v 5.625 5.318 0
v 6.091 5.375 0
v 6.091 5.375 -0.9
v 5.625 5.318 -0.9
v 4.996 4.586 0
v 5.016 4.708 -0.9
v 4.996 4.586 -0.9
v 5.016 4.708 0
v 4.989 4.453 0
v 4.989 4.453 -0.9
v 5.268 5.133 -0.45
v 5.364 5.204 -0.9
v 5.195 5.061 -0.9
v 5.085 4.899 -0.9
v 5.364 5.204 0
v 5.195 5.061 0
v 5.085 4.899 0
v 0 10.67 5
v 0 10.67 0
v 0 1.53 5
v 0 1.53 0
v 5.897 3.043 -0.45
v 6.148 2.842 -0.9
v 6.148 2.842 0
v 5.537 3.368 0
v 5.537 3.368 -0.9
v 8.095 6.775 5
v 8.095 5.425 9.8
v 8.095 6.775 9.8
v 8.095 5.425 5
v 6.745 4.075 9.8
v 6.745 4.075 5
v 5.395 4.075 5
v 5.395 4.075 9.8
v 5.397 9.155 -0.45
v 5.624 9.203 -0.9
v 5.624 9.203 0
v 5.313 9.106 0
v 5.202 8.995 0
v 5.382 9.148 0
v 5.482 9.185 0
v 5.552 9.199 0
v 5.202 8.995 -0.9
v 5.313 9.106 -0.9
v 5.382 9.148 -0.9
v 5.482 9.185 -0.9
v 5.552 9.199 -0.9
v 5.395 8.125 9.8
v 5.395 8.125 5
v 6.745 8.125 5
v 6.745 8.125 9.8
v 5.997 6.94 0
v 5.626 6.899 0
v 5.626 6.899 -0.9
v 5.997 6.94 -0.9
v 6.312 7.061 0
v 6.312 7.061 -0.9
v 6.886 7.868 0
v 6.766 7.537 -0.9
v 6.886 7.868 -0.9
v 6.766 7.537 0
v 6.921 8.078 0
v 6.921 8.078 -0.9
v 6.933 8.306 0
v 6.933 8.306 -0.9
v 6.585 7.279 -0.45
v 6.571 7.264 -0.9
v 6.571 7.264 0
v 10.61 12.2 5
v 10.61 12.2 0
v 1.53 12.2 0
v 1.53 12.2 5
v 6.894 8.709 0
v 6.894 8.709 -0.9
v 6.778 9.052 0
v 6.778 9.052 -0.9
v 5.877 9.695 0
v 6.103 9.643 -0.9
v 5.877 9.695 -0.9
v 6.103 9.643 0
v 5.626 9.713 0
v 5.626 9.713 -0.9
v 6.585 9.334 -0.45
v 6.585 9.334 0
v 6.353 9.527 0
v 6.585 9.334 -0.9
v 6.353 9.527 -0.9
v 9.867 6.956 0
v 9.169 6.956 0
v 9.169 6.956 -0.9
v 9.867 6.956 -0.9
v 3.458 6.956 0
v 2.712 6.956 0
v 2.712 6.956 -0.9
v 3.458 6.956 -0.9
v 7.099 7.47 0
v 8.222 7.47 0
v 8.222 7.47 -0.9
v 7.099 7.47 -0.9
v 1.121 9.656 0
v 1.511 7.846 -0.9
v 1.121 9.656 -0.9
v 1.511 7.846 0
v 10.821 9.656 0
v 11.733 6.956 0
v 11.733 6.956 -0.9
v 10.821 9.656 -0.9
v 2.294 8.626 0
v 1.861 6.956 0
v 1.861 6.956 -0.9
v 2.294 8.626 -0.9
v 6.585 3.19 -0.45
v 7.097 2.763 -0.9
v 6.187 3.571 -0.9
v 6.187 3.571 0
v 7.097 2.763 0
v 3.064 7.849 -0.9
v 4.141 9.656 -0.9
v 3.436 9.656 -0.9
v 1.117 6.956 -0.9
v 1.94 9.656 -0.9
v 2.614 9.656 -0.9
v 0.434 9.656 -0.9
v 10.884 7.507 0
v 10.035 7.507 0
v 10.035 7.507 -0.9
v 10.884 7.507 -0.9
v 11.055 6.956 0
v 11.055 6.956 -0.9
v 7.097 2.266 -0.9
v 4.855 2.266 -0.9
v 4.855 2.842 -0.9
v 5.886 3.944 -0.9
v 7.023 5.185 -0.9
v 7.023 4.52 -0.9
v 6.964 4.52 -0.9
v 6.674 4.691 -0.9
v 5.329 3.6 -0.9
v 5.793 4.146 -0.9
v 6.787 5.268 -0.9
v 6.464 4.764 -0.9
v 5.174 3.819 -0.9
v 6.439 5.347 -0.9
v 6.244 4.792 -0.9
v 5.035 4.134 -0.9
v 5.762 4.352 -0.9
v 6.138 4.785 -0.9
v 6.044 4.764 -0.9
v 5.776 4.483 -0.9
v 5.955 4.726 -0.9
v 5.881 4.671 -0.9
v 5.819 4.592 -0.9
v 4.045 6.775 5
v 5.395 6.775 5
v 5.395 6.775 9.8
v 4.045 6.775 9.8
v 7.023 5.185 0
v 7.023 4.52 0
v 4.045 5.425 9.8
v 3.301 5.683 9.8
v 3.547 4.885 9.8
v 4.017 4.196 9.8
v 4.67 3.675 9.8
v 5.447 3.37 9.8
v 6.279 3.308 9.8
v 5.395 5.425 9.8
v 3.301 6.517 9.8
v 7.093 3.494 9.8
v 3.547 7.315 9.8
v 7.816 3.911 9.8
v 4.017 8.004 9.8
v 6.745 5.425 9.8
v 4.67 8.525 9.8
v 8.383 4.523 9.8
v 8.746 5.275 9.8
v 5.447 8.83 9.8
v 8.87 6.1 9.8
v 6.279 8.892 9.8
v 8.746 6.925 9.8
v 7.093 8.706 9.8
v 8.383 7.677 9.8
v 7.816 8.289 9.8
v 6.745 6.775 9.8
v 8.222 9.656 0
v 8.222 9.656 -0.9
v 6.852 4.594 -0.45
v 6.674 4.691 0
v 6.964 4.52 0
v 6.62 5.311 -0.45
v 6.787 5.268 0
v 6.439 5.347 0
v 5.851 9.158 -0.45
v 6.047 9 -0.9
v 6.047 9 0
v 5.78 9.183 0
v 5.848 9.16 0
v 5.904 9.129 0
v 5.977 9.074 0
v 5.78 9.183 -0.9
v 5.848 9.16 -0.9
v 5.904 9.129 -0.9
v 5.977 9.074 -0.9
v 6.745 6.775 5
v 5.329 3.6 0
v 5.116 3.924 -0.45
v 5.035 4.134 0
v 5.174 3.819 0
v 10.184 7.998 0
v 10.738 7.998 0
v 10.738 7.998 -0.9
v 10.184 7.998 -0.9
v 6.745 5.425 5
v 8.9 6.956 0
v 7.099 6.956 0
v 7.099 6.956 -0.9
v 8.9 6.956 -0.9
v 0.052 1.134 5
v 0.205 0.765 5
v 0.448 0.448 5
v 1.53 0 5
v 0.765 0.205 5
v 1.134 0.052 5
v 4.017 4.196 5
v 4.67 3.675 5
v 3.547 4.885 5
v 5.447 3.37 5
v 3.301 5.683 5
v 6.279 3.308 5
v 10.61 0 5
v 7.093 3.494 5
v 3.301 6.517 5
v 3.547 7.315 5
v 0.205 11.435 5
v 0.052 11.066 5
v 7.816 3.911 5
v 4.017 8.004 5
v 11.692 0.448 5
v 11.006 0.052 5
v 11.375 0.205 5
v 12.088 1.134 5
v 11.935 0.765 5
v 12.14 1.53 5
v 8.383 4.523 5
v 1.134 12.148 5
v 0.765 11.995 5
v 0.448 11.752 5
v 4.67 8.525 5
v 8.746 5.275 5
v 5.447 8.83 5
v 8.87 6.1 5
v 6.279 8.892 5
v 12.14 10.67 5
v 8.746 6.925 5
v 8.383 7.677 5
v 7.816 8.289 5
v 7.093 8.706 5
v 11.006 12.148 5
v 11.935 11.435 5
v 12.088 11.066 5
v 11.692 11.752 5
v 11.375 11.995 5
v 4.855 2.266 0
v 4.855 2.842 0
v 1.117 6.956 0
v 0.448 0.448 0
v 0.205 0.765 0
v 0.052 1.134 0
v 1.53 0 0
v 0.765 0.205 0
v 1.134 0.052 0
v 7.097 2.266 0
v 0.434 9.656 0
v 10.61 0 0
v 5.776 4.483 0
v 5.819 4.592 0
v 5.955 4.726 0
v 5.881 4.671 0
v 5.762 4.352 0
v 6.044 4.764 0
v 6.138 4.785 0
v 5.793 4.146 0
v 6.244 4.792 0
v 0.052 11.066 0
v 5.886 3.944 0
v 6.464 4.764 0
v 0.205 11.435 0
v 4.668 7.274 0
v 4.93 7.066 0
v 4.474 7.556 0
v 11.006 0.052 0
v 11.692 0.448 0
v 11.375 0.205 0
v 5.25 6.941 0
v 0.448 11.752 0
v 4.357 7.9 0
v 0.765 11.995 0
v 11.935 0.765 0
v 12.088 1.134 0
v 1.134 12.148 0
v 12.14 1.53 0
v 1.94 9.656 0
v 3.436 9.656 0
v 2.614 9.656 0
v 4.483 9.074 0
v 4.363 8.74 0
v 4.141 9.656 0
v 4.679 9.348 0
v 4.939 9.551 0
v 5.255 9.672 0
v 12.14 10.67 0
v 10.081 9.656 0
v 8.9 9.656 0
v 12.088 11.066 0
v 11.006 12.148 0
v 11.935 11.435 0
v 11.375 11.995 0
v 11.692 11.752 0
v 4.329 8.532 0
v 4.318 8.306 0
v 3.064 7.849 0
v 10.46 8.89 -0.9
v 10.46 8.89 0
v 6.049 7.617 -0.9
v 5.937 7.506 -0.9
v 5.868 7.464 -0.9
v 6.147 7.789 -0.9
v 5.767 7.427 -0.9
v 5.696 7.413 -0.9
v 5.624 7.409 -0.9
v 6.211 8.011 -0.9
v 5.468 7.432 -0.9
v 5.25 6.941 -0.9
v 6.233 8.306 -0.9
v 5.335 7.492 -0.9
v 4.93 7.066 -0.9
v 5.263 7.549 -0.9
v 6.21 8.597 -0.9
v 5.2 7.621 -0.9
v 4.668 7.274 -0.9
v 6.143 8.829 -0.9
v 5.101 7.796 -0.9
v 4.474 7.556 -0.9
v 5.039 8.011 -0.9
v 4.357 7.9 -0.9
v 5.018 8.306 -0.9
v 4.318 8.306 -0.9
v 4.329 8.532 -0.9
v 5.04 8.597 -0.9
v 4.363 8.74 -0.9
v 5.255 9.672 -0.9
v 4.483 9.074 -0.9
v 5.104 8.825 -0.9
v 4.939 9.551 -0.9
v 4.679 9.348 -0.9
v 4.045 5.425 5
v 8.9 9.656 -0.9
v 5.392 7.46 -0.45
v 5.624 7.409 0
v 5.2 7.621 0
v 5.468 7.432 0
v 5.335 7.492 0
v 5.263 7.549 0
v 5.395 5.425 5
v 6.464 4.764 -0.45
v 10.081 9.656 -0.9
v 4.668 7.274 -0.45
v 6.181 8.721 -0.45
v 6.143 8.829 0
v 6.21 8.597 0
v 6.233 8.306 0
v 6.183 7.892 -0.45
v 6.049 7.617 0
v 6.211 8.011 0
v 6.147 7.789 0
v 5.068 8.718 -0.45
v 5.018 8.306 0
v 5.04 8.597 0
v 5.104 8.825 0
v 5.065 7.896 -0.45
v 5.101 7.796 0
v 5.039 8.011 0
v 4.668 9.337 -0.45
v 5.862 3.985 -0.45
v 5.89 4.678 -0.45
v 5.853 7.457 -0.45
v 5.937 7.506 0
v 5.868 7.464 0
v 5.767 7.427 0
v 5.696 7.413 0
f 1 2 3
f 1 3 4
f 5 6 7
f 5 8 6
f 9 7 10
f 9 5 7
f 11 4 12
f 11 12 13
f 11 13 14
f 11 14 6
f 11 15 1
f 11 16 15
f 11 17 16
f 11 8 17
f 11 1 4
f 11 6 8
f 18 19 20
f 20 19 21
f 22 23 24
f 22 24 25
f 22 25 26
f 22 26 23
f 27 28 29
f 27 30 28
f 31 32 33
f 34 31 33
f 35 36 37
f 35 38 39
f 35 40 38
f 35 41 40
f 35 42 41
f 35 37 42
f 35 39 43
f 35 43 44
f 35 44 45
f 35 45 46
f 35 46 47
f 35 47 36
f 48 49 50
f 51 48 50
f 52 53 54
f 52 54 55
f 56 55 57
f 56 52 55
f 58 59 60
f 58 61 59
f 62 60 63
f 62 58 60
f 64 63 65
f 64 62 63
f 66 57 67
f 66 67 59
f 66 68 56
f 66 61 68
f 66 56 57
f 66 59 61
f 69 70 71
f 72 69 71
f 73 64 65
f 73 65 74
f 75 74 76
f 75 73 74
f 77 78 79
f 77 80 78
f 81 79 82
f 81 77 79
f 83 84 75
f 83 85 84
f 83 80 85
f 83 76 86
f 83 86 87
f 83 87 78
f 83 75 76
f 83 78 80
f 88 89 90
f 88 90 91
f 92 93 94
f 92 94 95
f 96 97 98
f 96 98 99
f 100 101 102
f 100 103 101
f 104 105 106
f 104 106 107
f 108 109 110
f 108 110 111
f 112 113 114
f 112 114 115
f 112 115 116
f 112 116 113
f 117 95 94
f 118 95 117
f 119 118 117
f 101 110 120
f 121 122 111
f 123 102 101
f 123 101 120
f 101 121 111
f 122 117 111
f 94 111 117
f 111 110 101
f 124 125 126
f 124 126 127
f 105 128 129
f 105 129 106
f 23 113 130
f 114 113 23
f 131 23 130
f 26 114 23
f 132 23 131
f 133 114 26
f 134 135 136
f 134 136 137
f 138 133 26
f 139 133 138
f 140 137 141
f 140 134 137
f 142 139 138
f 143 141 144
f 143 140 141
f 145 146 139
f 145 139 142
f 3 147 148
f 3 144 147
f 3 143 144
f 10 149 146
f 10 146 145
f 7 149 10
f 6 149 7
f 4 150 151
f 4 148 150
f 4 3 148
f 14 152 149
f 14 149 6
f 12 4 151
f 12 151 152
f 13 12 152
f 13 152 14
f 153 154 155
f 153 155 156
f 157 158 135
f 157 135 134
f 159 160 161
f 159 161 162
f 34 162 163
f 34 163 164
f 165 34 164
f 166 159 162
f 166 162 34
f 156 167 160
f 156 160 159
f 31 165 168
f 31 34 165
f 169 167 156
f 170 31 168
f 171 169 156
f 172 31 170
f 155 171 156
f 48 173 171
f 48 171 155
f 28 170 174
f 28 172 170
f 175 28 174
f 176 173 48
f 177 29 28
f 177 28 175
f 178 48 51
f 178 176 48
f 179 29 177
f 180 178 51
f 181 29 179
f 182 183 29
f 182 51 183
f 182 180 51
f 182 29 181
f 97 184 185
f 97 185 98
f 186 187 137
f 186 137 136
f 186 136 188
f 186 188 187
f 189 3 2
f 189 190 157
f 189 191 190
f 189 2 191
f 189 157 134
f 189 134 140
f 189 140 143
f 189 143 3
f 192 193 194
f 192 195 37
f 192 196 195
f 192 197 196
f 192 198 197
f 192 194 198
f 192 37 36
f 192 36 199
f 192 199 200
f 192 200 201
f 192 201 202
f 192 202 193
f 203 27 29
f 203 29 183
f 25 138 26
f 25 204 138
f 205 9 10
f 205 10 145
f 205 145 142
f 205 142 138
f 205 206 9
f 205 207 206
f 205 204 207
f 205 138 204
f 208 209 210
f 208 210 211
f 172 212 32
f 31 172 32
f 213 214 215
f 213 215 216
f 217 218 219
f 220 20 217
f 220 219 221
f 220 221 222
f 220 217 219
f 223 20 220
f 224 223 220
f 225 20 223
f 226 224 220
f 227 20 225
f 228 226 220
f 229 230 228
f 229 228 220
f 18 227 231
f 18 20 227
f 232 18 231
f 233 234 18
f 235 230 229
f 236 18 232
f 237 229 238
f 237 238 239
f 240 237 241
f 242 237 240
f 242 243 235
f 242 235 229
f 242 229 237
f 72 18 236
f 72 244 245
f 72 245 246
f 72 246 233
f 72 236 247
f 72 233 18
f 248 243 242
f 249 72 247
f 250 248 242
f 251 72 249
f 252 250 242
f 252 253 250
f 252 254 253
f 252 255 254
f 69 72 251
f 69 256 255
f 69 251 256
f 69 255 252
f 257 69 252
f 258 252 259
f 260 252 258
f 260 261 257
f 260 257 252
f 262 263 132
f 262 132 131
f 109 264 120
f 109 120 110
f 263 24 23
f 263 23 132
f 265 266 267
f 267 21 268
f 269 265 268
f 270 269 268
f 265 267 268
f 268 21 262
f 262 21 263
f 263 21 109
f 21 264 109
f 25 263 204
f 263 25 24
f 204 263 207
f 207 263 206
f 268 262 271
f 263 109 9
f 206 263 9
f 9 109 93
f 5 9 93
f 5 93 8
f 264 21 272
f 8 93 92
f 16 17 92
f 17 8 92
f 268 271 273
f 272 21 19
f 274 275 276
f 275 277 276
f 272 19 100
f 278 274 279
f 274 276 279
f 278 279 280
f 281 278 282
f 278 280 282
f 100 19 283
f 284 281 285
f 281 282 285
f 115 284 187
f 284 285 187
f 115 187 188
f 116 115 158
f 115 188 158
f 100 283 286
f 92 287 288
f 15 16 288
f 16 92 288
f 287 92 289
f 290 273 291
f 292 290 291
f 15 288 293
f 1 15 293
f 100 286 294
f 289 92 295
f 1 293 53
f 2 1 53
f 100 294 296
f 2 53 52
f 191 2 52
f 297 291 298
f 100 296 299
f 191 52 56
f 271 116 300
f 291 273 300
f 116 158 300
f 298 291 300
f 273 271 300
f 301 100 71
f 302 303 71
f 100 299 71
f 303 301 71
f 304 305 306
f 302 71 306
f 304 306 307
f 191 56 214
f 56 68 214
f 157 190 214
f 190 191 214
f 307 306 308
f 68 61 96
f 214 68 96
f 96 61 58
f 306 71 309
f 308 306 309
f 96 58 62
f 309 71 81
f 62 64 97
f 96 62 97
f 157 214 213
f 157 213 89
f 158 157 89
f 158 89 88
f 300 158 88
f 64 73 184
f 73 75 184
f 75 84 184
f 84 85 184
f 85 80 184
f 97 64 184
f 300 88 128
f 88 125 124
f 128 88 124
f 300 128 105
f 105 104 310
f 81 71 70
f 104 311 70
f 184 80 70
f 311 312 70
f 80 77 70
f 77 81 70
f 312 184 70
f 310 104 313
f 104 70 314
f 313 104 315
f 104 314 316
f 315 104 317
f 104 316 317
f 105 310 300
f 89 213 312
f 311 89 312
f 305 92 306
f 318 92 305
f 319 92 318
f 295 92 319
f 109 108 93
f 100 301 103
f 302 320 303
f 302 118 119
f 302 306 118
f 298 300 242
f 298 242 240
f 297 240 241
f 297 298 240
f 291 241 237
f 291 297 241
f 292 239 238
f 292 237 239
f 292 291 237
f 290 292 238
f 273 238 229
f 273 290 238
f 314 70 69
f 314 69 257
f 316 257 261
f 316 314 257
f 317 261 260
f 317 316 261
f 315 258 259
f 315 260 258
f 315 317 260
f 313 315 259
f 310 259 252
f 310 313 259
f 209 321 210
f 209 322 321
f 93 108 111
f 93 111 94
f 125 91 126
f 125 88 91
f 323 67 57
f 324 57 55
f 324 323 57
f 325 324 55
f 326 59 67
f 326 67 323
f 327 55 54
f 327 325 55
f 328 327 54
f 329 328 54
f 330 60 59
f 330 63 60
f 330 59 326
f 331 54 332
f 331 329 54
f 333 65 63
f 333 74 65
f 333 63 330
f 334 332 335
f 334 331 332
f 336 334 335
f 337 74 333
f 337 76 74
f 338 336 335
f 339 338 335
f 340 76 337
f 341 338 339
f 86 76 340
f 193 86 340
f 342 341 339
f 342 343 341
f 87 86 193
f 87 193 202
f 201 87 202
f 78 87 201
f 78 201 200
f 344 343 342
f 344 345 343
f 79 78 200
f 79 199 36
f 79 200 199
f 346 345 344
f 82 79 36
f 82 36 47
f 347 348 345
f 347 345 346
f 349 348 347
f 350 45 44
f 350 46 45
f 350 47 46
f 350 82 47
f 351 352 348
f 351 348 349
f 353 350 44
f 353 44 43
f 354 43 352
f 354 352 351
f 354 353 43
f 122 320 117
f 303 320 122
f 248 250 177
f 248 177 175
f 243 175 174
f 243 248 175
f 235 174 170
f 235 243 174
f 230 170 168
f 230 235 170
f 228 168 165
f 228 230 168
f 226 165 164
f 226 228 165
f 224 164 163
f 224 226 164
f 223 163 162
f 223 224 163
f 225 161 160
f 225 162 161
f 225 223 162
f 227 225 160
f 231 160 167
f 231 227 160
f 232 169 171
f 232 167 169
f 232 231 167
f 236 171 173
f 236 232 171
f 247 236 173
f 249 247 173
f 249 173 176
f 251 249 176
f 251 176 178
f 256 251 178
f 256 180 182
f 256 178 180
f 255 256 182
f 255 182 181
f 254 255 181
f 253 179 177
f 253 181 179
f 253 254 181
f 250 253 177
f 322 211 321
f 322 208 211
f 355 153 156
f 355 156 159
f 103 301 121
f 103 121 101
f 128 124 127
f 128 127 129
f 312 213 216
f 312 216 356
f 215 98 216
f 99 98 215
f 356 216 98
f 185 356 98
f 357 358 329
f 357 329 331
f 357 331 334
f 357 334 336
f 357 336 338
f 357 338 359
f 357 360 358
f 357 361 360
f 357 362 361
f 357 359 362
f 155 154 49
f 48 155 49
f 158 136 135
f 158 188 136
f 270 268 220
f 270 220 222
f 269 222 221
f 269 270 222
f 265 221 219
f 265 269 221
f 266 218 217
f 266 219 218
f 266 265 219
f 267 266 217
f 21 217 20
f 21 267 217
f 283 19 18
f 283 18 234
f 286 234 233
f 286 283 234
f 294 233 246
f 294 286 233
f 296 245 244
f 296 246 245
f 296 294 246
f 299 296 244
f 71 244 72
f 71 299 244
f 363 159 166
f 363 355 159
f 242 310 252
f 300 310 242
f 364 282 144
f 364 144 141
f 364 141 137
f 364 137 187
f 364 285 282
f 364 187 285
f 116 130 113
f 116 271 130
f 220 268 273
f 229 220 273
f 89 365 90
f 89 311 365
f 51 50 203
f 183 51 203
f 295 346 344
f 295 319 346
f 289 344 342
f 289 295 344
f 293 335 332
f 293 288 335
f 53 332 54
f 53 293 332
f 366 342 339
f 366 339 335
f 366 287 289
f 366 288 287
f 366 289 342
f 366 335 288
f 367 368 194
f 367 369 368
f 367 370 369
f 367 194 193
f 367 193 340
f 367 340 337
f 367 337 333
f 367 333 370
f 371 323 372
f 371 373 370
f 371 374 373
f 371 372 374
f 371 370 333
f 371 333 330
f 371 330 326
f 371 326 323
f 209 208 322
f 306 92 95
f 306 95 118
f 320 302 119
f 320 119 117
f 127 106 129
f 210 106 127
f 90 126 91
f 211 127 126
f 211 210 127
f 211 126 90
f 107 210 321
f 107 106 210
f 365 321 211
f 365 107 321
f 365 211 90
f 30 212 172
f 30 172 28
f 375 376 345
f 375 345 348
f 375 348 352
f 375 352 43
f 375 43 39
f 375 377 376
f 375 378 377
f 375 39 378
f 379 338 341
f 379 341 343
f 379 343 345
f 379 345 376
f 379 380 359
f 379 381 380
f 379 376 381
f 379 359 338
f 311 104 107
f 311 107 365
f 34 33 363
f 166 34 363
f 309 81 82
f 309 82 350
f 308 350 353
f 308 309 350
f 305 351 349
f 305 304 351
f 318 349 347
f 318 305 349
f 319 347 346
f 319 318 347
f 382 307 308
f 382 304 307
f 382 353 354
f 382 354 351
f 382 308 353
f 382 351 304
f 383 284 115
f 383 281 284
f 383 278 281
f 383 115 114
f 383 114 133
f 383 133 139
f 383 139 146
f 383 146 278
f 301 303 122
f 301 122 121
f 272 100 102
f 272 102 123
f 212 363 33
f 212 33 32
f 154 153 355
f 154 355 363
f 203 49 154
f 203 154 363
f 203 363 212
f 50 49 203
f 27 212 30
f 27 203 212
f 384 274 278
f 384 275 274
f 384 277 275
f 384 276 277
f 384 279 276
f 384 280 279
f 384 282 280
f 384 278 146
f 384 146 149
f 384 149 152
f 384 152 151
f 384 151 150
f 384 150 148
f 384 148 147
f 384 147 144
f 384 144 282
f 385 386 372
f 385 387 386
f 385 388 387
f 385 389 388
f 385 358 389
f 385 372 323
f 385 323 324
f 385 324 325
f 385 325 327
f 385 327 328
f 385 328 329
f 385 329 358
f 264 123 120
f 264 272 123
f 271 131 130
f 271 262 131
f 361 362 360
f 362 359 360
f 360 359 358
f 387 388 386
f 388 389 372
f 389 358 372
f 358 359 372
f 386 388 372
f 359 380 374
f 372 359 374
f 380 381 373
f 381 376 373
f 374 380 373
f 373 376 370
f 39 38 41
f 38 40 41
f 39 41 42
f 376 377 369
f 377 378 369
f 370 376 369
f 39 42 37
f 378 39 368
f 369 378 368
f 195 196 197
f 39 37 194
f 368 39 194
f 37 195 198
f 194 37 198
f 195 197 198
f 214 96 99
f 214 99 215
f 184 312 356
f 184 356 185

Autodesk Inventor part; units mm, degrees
ref_plane "YZ Plane" through (0, 0, 0) normal (1, 0, 0) x (0, 1, 0)
ref_plane "XZ Plane" through (0, 0, 0) normal (0, 1, 0) x (-1, 0, 0)
sketch "Sketch1" plane through (0, 0, 0) normal (0, 0, 1) x (1, 0, 0)
  line L0 (14.6962, 12.74) -> (14.6962, 0) construction
  line L1 (10.61, 12.2) -> (1.53, 12.2)
  arc A0 (1.53, 12.2) -> (0, 10.67) centre (1.53, 10.67) ccw
  line L2 (0, 10.67) -> (0, 1.53)
  arc A1 (0, 1.53) -> (1.53, 0) centre (1.53, 1.53) ccw
  line L3 (1.53, 0) -> (10.61, 0)
  arc A2 (10.61, 0) -> (12.14, 1.53) centre (10.61, 1.53) ccw
  arc A3 (12.14, 10.67) -> (10.61, 12.2) centre (10.61, 10.67) ccw
  line L4 (12.14, 10.67) -> (12.14, 1.53)
  point P0 (0, 0)
  point P1 (0, 0)
  dimension "d10" = 12.74
ref_plane "Work Plane1" through (0, 0, 5) normal (0, 0, 1) x (1, 0, 0)
sketch "Sketch2" plane through (0, 0, 5) normal (0, 0, 1) x (1, 0, 0)
  line L0 (10.88, 12.74) -> (1.8, 12.74) projected
  line L1 (10.88, 12.74) -> (1.8, 12.74) projected
  arc A0 (1.8, 12.74) -> (0, 10.94) centre (1.8, 10.94) ccw projected
  line L2 (0, 10.94) -> (0, 1.8) projected
  arc A1 (0, 1.8) -> (1.8, 0) centre (1.8, 1.8) ccw projected
  line L3 (1.8, 0) -> (10.88, 0) projected
  arc A2 (10.88, 0) -> (12.68, 1.8) centre (10.88, 1.8) ccw projected
  line L4 (12.68, 1.8) -> (12.68, 10.94) projected
  arc A3 (12.68, 10.94) -> (10.88, 12.74) centre (10.88, 10.94) ccw projected
  circle A4 centre (6.34, 6.37) radius 2.8
  line L5 (5.665, 8.395) -> (7.015, 8.395)
  line L6 (7.015, 4.345) -> (5.665, 4.345)
  line L7 (5.665, 4.345) -> (7.015, 8.395) construction
  line L8 (5.665, 8.395) -> (7.015, 4.345) construction
  line L9 (8.365, 5.695) -> (8.365, 7.045)
  line L10 (4.315, 7.045) -> (4.315, 5.695)
  line L11 (4.315, 5.695) -> (8.365, 7.045) construction
  line L12 (8.365, 5.695) -> (4.315, 7.045) construction
  line L13 (4.315, 5.695) -> (5.665, 5.695)
  line L14 (7.015, 5.695) -> (8.365, 5.695)
  line L15 (5.665, 4.345) -> (5.665, 5.695)
  line L16 (5.665, 7.045) -> (5.665, 8.395)
  line L17 (8.365, 7.045) -> (7.015, 7.045)
  line L18 (5.665, 7.045) -> (4.315, 7.045)
  line L19 (7.015, 8.395) -> (7.015, 7.045)
  line L20 (7.015, 5.695) -> (7.015, 4.345)
  point P0 (0, 0)
  dimension "d3" = 5.6
  dimension "d4" = 4.05
  dimension "d5" = 1.35
  dimension "d6" = 4.05
  dimension "d7" = 1.35
extrude "Extrusion3" add sketch "Sketch1" along normal blind 5
sketch "Sketch3" plane through (0, 0, 5) normal (0, 0, 1) x (1, 0, 0)
  line L0 (10.61, 12.47) -> (1.53, 12.47)
  line L1 (10.61, 12.47) -> (1.53, 12.47)
  arc A0 (1.53, 12.47) -> (-0.27, 10.67) centre (1.53, 10.67) ccw
  line L2 (-0.27, 10.67) -> (-0.27, 1.53)
  arc A1 (-0.27, 1.53) -> (1.53, -0.27) centre (1.53, 1.53) ccw
  line L3 (1.53, -0.27) -> (10.61, -0.27)
  arc A2 (10.61, -0.27) -> (12.41, 1.53) centre (10.61, 1.53) ccw
  line L4 (12.41, 1.53) -> (12.41, 10.67)
  arc A3 (12.41, 10.67) -> (10.61, 12.47) centre (10.61, 10.67) ccw
  circle A4 centre (6.07, 6.1) radius 2.8
  line L5 (5.395, 8.125) -> (6.745, 8.125)
  line L6 (6.745, 4.075) -> (5.395, 4.075)
  line L7 (5.395, 4.075) -> (6.745, 8.125) construction
  line L8 (5.395, 8.125) -> (6.745, 4.075) construction
  line L9 (8.095, 5.425) -> (8.095, 6.775)
  line L10 (4.045, 6.775) -> (4.045, 5.425)
  line L11 (4.045, 5.425) -> (8.095, 6.775) construction
  line L12 (8.095, 5.425) -> (4.045, 6.775) construction
  line L13 (4.045, 5.425) -> (5.395, 5.425)
  line L14 (6.745, 5.425) -> (8.095, 5.425)
  line L15 (5.395, 4.075) -> (5.395, 5.425)
  line L16 (5.395, 6.775) -> (5.395, 8.125)
  line L17 (8.095, 6.775) -> (6.745, 6.775)
  line L18 (5.395, 6.775) -> (4.045, 6.775)
  line L19 (6.745, 8.125) -> (6.745, 6.775)
  line L20 (6.745, 5.425) -> (6.745, 4.075)
  line L21 (10.61, 12.2) -> (1.53, 12.2) projected
  line L22 (0, 10.67) -> (0, 1.53) projected
  point P0 (0, 0)
  point P1 (-0.27, -0.27)
  point P2 (6.07, 12.2)
  point P3 (0, 6.1)
  point P4 (6.07, 6.1)
  dimension "d14" = 5.6
  dimension "d15" = 4.05
  dimension "d16" = 1.35
  dimension "d17" = 4.05
  dimension "d18" = 1.35
extrude "Extrusion4" add sketch "Sketch3" along normal blind 4.8 contours A4
sketch "Sketch4" plane through (0, 0, 0) normal (0, 0, -1) x (-1, 0, 0)
  line L0 (-1.53, 0) -> (-10.61, 0) projected
  line L1 (-11.7223, 9.7129) -> (-0.4177, 9.7129) construction
  line L2 (-0.4177, 9.7129) -> (-0.4177, 6.84) construction
  line L3 (-0.4177, 6.84) -> (-11.7223, 6.84) construction
  line L4 (-11.7223, 6.84) -> (-11.7223, 9.7129) construction
  line L5 (-7.4059, 5.3753) -> (-4.7341, 5.3753) construction
  line L6 (-4.7341, 5.3753) -> (-4.7341, 2.266) construction
  line L7 (-4.7341, 2.266) -> (-7.4059, 2.266) construction
  line L8 (-7.4059, 2.266) -> (-7.4059, 5.3753) construction
  line L9 (-11.7333, 6.956) -> (-10.8209, 9.656)
  line L10 (-10.8209, 9.656) -> (-10.0813, 9.656)
  line L11 (-10.0813, 9.656) -> (-9.1689, 6.956)
  line L12 (-9.1689, 6.956) -> (-9.8669, 6.956)
  line L13 (-9.8669, 6.956) -> (-10.0354, 7.5074)
  line L14 (-10.0354, 7.5074) -> (-10.8843, 7.5074)
  line L15 (-10.8843, 7.5074) -> (-11.055, 6.956)
  line L16 (-11.055, 6.956) -> (-11.7333, 6.956)
  line L17 (-10.1842, 7.9975) -> (-10.4598, 8.8902)
  line L18 (-10.4598, 8.8902) -> (-10.7377, 7.9975)
  line L19 (-10.7377, 7.9975) -> (-10.1842, 7.9975)
  line L20 (-7.0991, 6.956) -> (-8.8998, 6.956)
  line L21 (-8.8998, 6.956) -> (-8.8998, 9.656)
  line L22 (-8.8998, 9.656) -> (-8.2215, 9.656)
  line L23 (-8.2215, 9.656) -> (-8.2215, 7.4702)
  line L24 (-8.2215, 7.4702) -> (-7.0991, 7.4702)
  line L25 (-7.0991, 7.4702) -> (-7.0991, 6.956)
  spline S0 degree 2 poles (-4.3181, 8.306) (-4.3181, 7.6496) (-5.0183, 6.8991) (-5.6265, 6.8991) knots 0 0 0 1 2 2 2
  spline S1 degree 2 poles (-5.6265, 6.8991) (-6.237, 6.8991) (-6.9328, 7.6584) (-6.9328, 8.306) knots 0 0 0 1 2 2 2
  spline S2 degree 2 poles (-6.9328, 8.306) (-6.9328, 8.9559) (-6.237, 9.7129) (-5.6265, 9.7129) knots 0 0 0 1 2 2 2
  spline S3 degree 2 poles (-5.6265, 9.7129) (-5.0183, 9.7129) (-4.3181, 8.9602) (-4.3181, 8.306) knots 0 0 0 1 2 2 2
  spline S4 degree 2 poles (-5.0183, 8.306) (-5.0183, 8.5489) (-5.1167, 8.888) (-5.2021, 8.9952) knots 0 0 0 1 2 2 2
  spline S5 degree 2 poles (-5.2021, 8.9952) (-5.2874, 9.1068) (-5.5062, 9.2031) (-5.6243, 9.2031) knots 0 0 0 1 2 2 2
  spline S6 degree 2 poles (-5.6243, 9.2031) (-5.7491, 9.2031) (-5.9525, 9.1134) (-6.0466, 8.9996) knots 0 0 0 1 2 2 2
  spline S7 degree 2 poles (-6.0466, 8.9996) (-6.1298, 8.8946) (-6.2326, 8.5467) (-6.2326, 8.306) knots 0 0 0 1 2 2 2
  spline S8 degree 2 poles (-6.2326, 8.306) (-6.2326, 8.0566) (-6.1342, 7.7284) (-6.0488, 7.6168) knots 0 0 0 1 2 2 2
  spline S9 degree 2 poles (-6.0488, 7.6168) (-5.9635, 7.5052) (-5.7425, 7.4089) (-5.6243, 7.4089) knots 0 0 0 1 2 2 2
  spline S10 degree 2 poles (-5.6243, 7.4089) (-5.504, 7.4089) (-5.2808, 7.5118) (-5.1999, 7.6212) knots 0 0 0 1 2 2 2
  spline S11 degree 2 poles (-5.1999, 7.6212) (-5.1124, 7.7393) (-5.0183, 8.0522) (-5.0183, 8.306) knots 0 0 0 1 2 2 2
  line L26 (-0.4344, 9.656) -> (-1.1171, 6.956)
  line L27 (-1.1171, 6.956) -> (-1.861, 6.956)
  line L28 (-1.861, 6.956) -> (-2.2942, 8.6255)
  line L29 (-2.2942, 8.6255) -> (-2.7121, 6.956)
  line L30 (-2.7121, 6.956) -> (-3.4582, 6.956)
  line L31 (-3.4582, 6.956) -> (-4.1409, 9.656)
  line L32 (-4.1409, 9.656) -> (-3.4363, 9.656)
  line L33 (-3.4363, 9.656) -> (-3.0644, 7.8487)
  line L34 (-3.0644, 7.8487) -> (-2.6136, 9.656)
  line L35 (-2.6136, 9.656) -> (-1.9397, 9.656)
  line L36 (-1.9397, 9.656) -> (-1.5109, 7.8465)
  line L37 (-1.5109, 7.8465) -> (-1.1214, 9.656)
  line L38 (-1.1214, 9.656) -> (-0.4344, 9.656)
  line L39 (-4.8552, 2.266) -> (-7.097, 2.266)
  line L40 (-7.097, 2.266) -> (-7.097, 2.7628)
  spline S12 degree 2 poles (-7.097, 2.7628) (-6.8127, 2.9902) (-6.3579, 3.3906) (-6.1874, 3.571) knots 0 0 0 1 2 2 2
  spline S13 degree 2 poles (-6.1874, 3.571) (-5.9625, 3.8058) (-5.7623, 4.1642) (-5.7623, 4.3521) knots 0 0 0 1 2 2 2
  spline S14 degree 2 poles (-5.7623, 4.3521) (-5.7623, 4.5646) (-6.0169, 4.792) (-6.2443, 4.792) knots 0 0 0 1 2 2 2
  spline S15 degree 2 poles (-6.2443, 4.792) (-6.3604, 4.792) (-6.568, 4.7352) (-6.6743, 4.6907) knots 0 0 0 1 2 2 2
  spline S16 degree 2 poles (-6.6743, 4.6907) (-6.7781, 4.6437) (-6.9264, 4.5448) (-6.9635, 4.5201) knots 0 0 0 1 2 2 2
  line L41 (-6.9635, 4.5201) -> (-7.0228, 4.5201)
  line L42 (-7.0228, 4.5201) -> (-7.0228, 5.185)
  spline S17 degree 2 poles (-7.0228, 5.185) (-6.8943, 5.2468) (-6.3456, 5.3753) (-6.091, 5.3753) knots 0 0 0 1 2 2 2
  spline S18 degree 2 poles (-6.091, 5.3753) (-5.5472, 5.3753) (-4.9887, 4.8909) (-4.9887, 4.4534) knots 0 0 0 1 2 2 2
  spline S19 degree 2 poles (-4.9887, 4.4534) (-4.9887, 4.184) (-5.2432, 3.6649) (-5.5374, 3.3684) knots 0 0 0 1 2 2 2
  spline S20 degree 2 poles (-5.5374, 3.3684) (-5.7227, 3.1854) (-6.0712, 2.9012) (-6.1479, 2.8419) knots 0 0 0 1 2 2 2
  line L43 (-6.1479, 2.8419) -> (-4.8552, 2.8419)
  line L44 (-4.8552, 2.8419) -> (-4.8552, 2.266)
  point P0 (0, 0)
  point P1 (-6.07, 2.266)
  point P2 (-6.07, 6.84)
  point P3 (-6.07, 6.84)
  point P4 (-6.07, 2.266)
extrude "Extrusion5" add sketch "Sketch4" along normal blind 0.9
properties part number "IPC ALOW 2 key"
